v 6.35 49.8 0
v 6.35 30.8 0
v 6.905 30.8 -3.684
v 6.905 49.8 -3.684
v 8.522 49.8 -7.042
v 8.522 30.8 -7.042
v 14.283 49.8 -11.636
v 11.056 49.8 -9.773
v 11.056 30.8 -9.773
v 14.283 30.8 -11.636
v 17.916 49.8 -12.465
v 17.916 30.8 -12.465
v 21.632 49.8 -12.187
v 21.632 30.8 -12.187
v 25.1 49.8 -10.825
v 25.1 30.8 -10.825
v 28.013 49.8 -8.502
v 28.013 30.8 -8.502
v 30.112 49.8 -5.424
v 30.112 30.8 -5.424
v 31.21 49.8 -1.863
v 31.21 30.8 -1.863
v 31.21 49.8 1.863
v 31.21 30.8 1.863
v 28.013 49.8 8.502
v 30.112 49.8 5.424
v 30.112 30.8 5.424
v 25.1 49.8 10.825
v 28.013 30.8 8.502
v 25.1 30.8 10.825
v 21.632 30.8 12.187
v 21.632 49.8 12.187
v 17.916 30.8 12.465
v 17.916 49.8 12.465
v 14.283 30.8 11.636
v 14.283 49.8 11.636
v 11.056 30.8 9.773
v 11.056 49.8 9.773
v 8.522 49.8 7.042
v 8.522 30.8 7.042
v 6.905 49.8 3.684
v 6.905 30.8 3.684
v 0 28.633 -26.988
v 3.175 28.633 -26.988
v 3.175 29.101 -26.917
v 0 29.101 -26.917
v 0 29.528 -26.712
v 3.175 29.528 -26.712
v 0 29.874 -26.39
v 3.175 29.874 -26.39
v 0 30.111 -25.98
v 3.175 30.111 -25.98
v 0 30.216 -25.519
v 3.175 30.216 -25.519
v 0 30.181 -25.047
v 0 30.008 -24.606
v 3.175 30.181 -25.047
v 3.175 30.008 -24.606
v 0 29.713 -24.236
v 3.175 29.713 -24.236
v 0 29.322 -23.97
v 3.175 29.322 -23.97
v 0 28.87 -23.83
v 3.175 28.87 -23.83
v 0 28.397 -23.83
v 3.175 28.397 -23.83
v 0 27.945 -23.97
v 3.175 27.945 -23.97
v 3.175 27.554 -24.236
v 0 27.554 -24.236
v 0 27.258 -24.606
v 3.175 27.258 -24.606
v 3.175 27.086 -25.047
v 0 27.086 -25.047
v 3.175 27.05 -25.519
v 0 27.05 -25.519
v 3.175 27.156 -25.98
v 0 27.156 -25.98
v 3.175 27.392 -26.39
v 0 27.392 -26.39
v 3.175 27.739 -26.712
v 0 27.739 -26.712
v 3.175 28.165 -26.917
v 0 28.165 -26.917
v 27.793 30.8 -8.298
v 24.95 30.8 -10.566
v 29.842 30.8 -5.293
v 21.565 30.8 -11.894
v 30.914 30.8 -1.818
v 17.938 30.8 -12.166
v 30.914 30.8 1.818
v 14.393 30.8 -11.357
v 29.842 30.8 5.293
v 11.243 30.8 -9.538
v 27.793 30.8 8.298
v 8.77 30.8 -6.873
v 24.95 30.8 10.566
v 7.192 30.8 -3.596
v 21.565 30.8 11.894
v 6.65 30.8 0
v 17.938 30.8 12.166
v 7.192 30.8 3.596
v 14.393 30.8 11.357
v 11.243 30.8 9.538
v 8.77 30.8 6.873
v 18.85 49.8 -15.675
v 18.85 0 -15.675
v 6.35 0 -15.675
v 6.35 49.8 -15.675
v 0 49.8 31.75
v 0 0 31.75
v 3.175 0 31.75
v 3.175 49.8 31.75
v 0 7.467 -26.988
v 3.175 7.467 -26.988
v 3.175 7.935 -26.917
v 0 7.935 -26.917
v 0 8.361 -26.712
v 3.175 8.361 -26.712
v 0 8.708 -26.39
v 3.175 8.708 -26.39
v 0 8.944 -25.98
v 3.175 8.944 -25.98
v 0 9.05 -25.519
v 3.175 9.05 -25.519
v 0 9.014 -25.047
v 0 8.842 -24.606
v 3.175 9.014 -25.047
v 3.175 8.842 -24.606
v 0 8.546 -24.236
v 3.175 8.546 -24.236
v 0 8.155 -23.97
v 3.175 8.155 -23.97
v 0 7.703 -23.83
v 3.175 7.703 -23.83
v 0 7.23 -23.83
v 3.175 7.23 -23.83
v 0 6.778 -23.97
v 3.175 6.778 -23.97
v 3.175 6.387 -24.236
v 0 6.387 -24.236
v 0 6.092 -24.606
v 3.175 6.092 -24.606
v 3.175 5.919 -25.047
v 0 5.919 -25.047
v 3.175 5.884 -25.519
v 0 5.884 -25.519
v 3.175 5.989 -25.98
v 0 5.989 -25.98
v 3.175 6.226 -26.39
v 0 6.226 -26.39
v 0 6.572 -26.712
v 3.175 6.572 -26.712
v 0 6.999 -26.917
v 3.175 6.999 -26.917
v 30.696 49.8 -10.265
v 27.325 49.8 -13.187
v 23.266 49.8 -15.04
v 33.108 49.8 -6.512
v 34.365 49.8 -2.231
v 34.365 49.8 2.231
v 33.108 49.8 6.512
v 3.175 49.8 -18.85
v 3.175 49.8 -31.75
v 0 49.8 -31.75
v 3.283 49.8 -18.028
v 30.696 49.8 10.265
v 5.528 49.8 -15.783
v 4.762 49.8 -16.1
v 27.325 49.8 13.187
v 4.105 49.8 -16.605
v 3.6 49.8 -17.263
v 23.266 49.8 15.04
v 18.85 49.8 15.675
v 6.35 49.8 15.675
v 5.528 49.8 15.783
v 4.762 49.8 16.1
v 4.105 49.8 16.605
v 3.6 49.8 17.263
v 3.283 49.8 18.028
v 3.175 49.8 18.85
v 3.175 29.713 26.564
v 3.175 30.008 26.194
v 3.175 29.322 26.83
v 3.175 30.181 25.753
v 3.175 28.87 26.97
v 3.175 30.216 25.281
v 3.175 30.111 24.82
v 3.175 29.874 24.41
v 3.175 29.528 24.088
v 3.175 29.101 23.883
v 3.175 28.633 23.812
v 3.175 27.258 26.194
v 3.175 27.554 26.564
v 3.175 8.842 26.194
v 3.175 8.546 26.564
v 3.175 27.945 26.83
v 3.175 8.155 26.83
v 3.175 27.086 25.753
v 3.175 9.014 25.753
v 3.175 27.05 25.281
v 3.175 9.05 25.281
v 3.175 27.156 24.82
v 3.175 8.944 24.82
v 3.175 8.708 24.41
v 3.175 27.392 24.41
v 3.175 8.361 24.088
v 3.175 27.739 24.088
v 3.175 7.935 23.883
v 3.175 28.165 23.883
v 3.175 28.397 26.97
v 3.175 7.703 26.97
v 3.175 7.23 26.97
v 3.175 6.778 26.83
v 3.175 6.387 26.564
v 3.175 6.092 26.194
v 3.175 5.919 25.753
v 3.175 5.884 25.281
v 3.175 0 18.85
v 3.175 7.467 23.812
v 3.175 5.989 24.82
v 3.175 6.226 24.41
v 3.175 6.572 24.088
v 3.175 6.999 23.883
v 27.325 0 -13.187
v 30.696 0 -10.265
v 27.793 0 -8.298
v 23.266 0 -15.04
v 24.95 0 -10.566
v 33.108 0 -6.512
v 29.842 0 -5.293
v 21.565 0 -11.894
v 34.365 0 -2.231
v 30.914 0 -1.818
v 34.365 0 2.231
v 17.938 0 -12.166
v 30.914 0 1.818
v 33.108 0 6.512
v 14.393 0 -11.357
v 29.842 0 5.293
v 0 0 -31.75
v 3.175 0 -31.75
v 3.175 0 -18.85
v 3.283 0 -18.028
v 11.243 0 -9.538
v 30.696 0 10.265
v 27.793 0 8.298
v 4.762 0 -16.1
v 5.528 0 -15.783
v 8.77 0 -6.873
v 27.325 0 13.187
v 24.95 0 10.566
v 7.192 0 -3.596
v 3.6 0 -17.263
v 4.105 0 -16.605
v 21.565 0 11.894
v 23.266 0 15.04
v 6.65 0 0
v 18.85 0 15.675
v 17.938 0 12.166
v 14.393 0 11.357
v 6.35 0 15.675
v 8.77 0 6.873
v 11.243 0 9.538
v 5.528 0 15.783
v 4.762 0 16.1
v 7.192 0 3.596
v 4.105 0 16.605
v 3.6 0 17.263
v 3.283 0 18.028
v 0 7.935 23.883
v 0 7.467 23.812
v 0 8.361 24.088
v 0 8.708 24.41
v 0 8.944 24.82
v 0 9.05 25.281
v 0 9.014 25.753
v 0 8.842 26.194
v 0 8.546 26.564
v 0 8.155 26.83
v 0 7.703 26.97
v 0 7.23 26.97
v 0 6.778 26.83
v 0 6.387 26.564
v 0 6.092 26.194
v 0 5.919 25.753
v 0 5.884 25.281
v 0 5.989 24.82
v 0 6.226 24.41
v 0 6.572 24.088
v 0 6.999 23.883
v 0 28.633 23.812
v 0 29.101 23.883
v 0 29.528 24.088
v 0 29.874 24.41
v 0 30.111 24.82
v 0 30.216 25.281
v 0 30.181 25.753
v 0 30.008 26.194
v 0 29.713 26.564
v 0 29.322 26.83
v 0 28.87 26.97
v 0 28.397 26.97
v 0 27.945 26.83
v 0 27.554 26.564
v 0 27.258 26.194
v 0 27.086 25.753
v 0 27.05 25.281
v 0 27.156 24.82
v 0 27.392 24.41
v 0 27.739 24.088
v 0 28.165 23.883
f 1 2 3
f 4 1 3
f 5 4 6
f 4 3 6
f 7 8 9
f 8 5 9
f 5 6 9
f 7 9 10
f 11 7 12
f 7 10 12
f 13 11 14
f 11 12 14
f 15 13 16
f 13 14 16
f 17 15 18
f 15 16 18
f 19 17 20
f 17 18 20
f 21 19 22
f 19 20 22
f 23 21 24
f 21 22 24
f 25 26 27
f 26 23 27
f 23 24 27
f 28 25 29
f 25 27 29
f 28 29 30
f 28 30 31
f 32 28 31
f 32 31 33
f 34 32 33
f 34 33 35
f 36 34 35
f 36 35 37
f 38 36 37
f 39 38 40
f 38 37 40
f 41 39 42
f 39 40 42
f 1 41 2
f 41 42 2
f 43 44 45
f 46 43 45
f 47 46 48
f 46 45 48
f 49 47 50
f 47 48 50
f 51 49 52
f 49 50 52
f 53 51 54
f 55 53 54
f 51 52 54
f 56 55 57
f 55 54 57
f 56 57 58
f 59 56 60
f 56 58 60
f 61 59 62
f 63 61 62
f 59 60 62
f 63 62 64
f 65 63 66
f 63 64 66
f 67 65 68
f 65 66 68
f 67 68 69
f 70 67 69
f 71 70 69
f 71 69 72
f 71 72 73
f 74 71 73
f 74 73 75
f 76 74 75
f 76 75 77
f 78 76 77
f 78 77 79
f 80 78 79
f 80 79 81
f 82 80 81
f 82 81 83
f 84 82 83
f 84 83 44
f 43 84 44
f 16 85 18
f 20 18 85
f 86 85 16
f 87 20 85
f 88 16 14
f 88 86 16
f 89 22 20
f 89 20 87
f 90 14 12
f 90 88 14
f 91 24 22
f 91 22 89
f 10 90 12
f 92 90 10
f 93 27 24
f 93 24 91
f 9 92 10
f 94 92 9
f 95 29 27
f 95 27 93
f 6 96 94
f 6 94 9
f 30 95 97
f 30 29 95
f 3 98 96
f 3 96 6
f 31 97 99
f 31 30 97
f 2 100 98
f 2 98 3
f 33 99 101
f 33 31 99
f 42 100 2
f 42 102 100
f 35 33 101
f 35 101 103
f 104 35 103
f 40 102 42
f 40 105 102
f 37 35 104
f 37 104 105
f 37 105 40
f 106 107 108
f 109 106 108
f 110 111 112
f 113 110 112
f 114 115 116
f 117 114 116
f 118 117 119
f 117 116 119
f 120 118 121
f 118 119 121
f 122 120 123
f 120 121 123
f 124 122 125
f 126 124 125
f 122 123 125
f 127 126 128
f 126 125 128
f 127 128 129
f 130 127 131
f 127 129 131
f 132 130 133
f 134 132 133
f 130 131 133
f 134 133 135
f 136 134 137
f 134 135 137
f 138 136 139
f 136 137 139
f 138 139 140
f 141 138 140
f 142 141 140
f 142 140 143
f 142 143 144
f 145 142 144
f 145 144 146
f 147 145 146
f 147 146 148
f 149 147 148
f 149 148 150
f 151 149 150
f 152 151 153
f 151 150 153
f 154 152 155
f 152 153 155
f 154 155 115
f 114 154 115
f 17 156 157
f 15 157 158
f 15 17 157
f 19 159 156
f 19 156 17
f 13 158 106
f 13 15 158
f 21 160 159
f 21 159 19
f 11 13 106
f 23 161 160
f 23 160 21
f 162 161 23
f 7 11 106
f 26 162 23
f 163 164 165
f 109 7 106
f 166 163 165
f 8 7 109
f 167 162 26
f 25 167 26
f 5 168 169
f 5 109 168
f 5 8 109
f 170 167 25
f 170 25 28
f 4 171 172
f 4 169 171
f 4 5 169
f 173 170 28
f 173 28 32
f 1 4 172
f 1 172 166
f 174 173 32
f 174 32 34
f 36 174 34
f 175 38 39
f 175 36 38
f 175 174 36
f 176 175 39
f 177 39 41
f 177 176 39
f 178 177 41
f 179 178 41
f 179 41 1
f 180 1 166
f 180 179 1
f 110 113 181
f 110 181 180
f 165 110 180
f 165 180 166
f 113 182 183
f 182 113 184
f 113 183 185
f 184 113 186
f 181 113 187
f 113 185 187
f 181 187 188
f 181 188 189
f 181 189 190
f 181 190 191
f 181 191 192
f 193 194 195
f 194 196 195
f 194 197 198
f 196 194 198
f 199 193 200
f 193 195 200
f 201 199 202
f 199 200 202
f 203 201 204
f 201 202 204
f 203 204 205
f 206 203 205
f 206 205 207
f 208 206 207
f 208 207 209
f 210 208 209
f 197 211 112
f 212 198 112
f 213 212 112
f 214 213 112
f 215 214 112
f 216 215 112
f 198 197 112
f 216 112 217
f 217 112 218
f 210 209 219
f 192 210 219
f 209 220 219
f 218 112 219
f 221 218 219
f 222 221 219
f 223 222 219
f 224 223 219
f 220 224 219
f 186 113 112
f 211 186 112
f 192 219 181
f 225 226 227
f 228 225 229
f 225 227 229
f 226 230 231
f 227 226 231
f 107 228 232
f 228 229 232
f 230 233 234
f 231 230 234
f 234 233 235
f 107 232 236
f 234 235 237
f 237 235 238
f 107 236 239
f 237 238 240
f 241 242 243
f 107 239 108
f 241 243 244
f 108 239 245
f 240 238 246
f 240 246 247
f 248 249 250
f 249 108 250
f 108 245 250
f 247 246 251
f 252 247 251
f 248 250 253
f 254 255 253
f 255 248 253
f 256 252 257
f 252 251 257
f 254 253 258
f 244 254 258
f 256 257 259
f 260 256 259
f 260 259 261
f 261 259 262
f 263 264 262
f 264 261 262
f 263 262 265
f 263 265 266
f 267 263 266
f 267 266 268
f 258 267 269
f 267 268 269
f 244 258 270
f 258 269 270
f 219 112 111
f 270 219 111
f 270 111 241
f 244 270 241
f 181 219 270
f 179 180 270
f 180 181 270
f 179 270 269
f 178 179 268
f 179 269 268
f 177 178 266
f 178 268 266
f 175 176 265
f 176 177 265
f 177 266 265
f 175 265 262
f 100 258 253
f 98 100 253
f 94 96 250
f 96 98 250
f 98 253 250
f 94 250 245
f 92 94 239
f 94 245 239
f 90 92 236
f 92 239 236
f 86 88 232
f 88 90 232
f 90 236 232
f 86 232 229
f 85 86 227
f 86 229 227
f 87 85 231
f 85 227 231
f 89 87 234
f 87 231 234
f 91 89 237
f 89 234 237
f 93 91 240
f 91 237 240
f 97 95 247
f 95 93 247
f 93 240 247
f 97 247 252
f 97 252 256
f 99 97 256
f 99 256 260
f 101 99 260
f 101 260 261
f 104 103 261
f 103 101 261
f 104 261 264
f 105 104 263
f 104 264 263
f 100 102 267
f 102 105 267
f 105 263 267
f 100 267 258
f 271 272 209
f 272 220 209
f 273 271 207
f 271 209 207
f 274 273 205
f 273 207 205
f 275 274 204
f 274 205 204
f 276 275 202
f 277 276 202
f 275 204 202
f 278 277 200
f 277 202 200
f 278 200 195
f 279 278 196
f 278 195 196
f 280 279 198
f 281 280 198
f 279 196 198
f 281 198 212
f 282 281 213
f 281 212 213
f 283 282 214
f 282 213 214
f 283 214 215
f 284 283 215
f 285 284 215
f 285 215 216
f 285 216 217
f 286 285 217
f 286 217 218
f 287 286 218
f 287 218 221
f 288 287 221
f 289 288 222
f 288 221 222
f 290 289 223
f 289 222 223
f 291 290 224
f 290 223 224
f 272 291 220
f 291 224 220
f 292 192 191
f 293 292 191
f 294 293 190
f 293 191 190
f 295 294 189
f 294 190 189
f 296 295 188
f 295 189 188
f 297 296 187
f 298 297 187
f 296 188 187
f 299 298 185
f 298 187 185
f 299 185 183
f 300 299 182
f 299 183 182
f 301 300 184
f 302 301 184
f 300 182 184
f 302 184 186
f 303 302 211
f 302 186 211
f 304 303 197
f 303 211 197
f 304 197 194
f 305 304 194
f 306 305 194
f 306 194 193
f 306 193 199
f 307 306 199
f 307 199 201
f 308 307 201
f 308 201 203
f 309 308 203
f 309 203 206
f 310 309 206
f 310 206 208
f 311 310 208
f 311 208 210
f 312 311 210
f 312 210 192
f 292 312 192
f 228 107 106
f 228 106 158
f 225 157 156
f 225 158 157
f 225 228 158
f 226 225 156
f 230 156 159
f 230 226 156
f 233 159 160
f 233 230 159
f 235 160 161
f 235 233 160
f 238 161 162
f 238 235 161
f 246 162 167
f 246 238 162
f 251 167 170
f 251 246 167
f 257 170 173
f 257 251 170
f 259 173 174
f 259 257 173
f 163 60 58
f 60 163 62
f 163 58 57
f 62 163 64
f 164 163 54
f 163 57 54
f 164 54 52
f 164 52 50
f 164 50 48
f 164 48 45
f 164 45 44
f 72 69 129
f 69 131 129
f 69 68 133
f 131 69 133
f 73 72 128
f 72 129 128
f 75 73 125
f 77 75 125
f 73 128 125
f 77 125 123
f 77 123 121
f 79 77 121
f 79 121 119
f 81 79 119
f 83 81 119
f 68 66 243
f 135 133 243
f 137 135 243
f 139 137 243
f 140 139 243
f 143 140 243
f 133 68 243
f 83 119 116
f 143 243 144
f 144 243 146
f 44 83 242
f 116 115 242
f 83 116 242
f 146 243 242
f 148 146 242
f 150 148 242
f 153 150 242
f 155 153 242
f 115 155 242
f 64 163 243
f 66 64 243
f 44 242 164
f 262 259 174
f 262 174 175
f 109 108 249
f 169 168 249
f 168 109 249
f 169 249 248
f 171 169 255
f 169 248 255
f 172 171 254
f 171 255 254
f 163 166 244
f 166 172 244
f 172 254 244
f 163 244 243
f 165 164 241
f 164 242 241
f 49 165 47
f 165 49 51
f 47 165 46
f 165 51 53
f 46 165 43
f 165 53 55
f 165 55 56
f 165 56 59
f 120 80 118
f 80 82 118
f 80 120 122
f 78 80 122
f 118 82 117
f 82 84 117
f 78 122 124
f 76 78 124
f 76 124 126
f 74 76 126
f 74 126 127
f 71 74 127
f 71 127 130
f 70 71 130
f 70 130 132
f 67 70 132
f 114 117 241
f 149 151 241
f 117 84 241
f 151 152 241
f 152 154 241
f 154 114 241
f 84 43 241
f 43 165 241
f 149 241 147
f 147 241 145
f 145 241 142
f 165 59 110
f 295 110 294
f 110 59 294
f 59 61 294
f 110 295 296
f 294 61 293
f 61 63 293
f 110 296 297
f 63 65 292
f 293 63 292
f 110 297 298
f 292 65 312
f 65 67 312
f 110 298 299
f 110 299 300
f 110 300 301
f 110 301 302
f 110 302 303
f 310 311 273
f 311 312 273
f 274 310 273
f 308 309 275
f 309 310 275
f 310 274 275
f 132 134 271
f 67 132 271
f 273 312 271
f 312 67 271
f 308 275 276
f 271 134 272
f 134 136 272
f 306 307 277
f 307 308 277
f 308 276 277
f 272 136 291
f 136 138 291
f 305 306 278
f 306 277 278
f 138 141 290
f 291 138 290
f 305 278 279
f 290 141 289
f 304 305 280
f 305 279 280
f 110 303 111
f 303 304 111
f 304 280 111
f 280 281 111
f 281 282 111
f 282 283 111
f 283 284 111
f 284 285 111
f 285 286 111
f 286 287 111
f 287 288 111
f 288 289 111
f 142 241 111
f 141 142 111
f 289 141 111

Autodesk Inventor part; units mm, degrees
ref_plane "YZ Plane" through (0, 0, 0) normal (1, 0, 0) x (0, 1, 0)
ref_plane "XZ Plane" through (0, 0, 0) normal (0, 1, 0) x (-1, 0, 0)
ref_plane "XY Plane" through (0, 0, 0) normal (0, 0, 1) x (1, 0, 0)
sketch "Sketch1" plane through (0, 0, 0) normal (0, 1, 0) x (-1, 0, 0)
  line L0 (0, 31.75) -> (-3.175, 31.75)
  line L1 (-3.175, -31.75) -> (0, -31.75)
  line L2 (0, -31.75) -> (0, 31.75)
  circle A0 centre (-18.85, 0) radius 12.5
  circle A1 centre (-18.85, 0) radius 12.2
  arc A2 (-18.85, 15.675) -> (-18.85, -15.675) centre (-18.85, 0) ccw
  line L3 (-18.85, 15.675) -> (-6.35, 15.675)
  line L4 (-18.85, -15.675) -> (-6.35, -15.675)
  line L5 (-3.175, 31.75) -> (-3.175, 18.85)
  line L6 (-3.175, -18.85) -> (-3.175, -31.75)
  arc A3 (-6.35, 15.675) -> (-3.175, 18.85) centre (-6.35, 18.85) ccw
  arc A4 (-3.175, -18.85) -> (-6.35, -15.675) centre (-6.35, -18.85) ccw
  point P0 (0, 0)
  dimension "d0" = 3.175
  dimension "d1" = 63.5
  dimension "d4" = 25
  dimension "d6" = 24.4
  dimension "d7" = 31.35
  dimension "d8" = 3.175
  dimension "d26" = 3.175
  dimension "d27" = 18.85
extrude "Extrusion1" add sketch "Sketch1" along normal blind 49.8 contours L2 L1 L6 A4 L4 A2 L3 A3 L5 L0
extrude "Extrusion2" add sketch "Sketch1" along normal blind 30.8 contours A0
sketch "Sketch2" plane through (3.175, 0, 31.75) normal (1, 0, 0) x (0, 0, -1)
  line L0 (63.5, 0) -> (63.5, 49.8) projected
  line L1 (0, 0) -> (0, 49.8) projected
  circle A0 centre (6.35, 28.6333) radius 1.5875
  circle A1 centre (6.35, 7.4667) radius 1.5875
  line L2 (0, 49.8) -> (12.9, 49.8) projected
  line L3 (31.75, 0) -> (31.75, 49.8)
  line L4 (19.25, 49.8) -> (44.25, 49.8) projected
  circle A2 centre (57.15, 28.6333) radius 1.5875
  circle A3 centre (57.15, 7.4667) radius 1.5875
  dimension "d14" = 63.5
  dimension "d16" = 3.175
  dimension "d17" = 3.175
  dimension "d18" = 21.1667
  dimension "d19" = 21.1667
  dimension "d20" = 0
  dimension "d21" = 6.35
  dimension "d22" = 31.75
extrude "Extrusion3" cut sketch "Sketch2" against normal blind 3.175
properties part number "Motor_Mount_3DPrint"
